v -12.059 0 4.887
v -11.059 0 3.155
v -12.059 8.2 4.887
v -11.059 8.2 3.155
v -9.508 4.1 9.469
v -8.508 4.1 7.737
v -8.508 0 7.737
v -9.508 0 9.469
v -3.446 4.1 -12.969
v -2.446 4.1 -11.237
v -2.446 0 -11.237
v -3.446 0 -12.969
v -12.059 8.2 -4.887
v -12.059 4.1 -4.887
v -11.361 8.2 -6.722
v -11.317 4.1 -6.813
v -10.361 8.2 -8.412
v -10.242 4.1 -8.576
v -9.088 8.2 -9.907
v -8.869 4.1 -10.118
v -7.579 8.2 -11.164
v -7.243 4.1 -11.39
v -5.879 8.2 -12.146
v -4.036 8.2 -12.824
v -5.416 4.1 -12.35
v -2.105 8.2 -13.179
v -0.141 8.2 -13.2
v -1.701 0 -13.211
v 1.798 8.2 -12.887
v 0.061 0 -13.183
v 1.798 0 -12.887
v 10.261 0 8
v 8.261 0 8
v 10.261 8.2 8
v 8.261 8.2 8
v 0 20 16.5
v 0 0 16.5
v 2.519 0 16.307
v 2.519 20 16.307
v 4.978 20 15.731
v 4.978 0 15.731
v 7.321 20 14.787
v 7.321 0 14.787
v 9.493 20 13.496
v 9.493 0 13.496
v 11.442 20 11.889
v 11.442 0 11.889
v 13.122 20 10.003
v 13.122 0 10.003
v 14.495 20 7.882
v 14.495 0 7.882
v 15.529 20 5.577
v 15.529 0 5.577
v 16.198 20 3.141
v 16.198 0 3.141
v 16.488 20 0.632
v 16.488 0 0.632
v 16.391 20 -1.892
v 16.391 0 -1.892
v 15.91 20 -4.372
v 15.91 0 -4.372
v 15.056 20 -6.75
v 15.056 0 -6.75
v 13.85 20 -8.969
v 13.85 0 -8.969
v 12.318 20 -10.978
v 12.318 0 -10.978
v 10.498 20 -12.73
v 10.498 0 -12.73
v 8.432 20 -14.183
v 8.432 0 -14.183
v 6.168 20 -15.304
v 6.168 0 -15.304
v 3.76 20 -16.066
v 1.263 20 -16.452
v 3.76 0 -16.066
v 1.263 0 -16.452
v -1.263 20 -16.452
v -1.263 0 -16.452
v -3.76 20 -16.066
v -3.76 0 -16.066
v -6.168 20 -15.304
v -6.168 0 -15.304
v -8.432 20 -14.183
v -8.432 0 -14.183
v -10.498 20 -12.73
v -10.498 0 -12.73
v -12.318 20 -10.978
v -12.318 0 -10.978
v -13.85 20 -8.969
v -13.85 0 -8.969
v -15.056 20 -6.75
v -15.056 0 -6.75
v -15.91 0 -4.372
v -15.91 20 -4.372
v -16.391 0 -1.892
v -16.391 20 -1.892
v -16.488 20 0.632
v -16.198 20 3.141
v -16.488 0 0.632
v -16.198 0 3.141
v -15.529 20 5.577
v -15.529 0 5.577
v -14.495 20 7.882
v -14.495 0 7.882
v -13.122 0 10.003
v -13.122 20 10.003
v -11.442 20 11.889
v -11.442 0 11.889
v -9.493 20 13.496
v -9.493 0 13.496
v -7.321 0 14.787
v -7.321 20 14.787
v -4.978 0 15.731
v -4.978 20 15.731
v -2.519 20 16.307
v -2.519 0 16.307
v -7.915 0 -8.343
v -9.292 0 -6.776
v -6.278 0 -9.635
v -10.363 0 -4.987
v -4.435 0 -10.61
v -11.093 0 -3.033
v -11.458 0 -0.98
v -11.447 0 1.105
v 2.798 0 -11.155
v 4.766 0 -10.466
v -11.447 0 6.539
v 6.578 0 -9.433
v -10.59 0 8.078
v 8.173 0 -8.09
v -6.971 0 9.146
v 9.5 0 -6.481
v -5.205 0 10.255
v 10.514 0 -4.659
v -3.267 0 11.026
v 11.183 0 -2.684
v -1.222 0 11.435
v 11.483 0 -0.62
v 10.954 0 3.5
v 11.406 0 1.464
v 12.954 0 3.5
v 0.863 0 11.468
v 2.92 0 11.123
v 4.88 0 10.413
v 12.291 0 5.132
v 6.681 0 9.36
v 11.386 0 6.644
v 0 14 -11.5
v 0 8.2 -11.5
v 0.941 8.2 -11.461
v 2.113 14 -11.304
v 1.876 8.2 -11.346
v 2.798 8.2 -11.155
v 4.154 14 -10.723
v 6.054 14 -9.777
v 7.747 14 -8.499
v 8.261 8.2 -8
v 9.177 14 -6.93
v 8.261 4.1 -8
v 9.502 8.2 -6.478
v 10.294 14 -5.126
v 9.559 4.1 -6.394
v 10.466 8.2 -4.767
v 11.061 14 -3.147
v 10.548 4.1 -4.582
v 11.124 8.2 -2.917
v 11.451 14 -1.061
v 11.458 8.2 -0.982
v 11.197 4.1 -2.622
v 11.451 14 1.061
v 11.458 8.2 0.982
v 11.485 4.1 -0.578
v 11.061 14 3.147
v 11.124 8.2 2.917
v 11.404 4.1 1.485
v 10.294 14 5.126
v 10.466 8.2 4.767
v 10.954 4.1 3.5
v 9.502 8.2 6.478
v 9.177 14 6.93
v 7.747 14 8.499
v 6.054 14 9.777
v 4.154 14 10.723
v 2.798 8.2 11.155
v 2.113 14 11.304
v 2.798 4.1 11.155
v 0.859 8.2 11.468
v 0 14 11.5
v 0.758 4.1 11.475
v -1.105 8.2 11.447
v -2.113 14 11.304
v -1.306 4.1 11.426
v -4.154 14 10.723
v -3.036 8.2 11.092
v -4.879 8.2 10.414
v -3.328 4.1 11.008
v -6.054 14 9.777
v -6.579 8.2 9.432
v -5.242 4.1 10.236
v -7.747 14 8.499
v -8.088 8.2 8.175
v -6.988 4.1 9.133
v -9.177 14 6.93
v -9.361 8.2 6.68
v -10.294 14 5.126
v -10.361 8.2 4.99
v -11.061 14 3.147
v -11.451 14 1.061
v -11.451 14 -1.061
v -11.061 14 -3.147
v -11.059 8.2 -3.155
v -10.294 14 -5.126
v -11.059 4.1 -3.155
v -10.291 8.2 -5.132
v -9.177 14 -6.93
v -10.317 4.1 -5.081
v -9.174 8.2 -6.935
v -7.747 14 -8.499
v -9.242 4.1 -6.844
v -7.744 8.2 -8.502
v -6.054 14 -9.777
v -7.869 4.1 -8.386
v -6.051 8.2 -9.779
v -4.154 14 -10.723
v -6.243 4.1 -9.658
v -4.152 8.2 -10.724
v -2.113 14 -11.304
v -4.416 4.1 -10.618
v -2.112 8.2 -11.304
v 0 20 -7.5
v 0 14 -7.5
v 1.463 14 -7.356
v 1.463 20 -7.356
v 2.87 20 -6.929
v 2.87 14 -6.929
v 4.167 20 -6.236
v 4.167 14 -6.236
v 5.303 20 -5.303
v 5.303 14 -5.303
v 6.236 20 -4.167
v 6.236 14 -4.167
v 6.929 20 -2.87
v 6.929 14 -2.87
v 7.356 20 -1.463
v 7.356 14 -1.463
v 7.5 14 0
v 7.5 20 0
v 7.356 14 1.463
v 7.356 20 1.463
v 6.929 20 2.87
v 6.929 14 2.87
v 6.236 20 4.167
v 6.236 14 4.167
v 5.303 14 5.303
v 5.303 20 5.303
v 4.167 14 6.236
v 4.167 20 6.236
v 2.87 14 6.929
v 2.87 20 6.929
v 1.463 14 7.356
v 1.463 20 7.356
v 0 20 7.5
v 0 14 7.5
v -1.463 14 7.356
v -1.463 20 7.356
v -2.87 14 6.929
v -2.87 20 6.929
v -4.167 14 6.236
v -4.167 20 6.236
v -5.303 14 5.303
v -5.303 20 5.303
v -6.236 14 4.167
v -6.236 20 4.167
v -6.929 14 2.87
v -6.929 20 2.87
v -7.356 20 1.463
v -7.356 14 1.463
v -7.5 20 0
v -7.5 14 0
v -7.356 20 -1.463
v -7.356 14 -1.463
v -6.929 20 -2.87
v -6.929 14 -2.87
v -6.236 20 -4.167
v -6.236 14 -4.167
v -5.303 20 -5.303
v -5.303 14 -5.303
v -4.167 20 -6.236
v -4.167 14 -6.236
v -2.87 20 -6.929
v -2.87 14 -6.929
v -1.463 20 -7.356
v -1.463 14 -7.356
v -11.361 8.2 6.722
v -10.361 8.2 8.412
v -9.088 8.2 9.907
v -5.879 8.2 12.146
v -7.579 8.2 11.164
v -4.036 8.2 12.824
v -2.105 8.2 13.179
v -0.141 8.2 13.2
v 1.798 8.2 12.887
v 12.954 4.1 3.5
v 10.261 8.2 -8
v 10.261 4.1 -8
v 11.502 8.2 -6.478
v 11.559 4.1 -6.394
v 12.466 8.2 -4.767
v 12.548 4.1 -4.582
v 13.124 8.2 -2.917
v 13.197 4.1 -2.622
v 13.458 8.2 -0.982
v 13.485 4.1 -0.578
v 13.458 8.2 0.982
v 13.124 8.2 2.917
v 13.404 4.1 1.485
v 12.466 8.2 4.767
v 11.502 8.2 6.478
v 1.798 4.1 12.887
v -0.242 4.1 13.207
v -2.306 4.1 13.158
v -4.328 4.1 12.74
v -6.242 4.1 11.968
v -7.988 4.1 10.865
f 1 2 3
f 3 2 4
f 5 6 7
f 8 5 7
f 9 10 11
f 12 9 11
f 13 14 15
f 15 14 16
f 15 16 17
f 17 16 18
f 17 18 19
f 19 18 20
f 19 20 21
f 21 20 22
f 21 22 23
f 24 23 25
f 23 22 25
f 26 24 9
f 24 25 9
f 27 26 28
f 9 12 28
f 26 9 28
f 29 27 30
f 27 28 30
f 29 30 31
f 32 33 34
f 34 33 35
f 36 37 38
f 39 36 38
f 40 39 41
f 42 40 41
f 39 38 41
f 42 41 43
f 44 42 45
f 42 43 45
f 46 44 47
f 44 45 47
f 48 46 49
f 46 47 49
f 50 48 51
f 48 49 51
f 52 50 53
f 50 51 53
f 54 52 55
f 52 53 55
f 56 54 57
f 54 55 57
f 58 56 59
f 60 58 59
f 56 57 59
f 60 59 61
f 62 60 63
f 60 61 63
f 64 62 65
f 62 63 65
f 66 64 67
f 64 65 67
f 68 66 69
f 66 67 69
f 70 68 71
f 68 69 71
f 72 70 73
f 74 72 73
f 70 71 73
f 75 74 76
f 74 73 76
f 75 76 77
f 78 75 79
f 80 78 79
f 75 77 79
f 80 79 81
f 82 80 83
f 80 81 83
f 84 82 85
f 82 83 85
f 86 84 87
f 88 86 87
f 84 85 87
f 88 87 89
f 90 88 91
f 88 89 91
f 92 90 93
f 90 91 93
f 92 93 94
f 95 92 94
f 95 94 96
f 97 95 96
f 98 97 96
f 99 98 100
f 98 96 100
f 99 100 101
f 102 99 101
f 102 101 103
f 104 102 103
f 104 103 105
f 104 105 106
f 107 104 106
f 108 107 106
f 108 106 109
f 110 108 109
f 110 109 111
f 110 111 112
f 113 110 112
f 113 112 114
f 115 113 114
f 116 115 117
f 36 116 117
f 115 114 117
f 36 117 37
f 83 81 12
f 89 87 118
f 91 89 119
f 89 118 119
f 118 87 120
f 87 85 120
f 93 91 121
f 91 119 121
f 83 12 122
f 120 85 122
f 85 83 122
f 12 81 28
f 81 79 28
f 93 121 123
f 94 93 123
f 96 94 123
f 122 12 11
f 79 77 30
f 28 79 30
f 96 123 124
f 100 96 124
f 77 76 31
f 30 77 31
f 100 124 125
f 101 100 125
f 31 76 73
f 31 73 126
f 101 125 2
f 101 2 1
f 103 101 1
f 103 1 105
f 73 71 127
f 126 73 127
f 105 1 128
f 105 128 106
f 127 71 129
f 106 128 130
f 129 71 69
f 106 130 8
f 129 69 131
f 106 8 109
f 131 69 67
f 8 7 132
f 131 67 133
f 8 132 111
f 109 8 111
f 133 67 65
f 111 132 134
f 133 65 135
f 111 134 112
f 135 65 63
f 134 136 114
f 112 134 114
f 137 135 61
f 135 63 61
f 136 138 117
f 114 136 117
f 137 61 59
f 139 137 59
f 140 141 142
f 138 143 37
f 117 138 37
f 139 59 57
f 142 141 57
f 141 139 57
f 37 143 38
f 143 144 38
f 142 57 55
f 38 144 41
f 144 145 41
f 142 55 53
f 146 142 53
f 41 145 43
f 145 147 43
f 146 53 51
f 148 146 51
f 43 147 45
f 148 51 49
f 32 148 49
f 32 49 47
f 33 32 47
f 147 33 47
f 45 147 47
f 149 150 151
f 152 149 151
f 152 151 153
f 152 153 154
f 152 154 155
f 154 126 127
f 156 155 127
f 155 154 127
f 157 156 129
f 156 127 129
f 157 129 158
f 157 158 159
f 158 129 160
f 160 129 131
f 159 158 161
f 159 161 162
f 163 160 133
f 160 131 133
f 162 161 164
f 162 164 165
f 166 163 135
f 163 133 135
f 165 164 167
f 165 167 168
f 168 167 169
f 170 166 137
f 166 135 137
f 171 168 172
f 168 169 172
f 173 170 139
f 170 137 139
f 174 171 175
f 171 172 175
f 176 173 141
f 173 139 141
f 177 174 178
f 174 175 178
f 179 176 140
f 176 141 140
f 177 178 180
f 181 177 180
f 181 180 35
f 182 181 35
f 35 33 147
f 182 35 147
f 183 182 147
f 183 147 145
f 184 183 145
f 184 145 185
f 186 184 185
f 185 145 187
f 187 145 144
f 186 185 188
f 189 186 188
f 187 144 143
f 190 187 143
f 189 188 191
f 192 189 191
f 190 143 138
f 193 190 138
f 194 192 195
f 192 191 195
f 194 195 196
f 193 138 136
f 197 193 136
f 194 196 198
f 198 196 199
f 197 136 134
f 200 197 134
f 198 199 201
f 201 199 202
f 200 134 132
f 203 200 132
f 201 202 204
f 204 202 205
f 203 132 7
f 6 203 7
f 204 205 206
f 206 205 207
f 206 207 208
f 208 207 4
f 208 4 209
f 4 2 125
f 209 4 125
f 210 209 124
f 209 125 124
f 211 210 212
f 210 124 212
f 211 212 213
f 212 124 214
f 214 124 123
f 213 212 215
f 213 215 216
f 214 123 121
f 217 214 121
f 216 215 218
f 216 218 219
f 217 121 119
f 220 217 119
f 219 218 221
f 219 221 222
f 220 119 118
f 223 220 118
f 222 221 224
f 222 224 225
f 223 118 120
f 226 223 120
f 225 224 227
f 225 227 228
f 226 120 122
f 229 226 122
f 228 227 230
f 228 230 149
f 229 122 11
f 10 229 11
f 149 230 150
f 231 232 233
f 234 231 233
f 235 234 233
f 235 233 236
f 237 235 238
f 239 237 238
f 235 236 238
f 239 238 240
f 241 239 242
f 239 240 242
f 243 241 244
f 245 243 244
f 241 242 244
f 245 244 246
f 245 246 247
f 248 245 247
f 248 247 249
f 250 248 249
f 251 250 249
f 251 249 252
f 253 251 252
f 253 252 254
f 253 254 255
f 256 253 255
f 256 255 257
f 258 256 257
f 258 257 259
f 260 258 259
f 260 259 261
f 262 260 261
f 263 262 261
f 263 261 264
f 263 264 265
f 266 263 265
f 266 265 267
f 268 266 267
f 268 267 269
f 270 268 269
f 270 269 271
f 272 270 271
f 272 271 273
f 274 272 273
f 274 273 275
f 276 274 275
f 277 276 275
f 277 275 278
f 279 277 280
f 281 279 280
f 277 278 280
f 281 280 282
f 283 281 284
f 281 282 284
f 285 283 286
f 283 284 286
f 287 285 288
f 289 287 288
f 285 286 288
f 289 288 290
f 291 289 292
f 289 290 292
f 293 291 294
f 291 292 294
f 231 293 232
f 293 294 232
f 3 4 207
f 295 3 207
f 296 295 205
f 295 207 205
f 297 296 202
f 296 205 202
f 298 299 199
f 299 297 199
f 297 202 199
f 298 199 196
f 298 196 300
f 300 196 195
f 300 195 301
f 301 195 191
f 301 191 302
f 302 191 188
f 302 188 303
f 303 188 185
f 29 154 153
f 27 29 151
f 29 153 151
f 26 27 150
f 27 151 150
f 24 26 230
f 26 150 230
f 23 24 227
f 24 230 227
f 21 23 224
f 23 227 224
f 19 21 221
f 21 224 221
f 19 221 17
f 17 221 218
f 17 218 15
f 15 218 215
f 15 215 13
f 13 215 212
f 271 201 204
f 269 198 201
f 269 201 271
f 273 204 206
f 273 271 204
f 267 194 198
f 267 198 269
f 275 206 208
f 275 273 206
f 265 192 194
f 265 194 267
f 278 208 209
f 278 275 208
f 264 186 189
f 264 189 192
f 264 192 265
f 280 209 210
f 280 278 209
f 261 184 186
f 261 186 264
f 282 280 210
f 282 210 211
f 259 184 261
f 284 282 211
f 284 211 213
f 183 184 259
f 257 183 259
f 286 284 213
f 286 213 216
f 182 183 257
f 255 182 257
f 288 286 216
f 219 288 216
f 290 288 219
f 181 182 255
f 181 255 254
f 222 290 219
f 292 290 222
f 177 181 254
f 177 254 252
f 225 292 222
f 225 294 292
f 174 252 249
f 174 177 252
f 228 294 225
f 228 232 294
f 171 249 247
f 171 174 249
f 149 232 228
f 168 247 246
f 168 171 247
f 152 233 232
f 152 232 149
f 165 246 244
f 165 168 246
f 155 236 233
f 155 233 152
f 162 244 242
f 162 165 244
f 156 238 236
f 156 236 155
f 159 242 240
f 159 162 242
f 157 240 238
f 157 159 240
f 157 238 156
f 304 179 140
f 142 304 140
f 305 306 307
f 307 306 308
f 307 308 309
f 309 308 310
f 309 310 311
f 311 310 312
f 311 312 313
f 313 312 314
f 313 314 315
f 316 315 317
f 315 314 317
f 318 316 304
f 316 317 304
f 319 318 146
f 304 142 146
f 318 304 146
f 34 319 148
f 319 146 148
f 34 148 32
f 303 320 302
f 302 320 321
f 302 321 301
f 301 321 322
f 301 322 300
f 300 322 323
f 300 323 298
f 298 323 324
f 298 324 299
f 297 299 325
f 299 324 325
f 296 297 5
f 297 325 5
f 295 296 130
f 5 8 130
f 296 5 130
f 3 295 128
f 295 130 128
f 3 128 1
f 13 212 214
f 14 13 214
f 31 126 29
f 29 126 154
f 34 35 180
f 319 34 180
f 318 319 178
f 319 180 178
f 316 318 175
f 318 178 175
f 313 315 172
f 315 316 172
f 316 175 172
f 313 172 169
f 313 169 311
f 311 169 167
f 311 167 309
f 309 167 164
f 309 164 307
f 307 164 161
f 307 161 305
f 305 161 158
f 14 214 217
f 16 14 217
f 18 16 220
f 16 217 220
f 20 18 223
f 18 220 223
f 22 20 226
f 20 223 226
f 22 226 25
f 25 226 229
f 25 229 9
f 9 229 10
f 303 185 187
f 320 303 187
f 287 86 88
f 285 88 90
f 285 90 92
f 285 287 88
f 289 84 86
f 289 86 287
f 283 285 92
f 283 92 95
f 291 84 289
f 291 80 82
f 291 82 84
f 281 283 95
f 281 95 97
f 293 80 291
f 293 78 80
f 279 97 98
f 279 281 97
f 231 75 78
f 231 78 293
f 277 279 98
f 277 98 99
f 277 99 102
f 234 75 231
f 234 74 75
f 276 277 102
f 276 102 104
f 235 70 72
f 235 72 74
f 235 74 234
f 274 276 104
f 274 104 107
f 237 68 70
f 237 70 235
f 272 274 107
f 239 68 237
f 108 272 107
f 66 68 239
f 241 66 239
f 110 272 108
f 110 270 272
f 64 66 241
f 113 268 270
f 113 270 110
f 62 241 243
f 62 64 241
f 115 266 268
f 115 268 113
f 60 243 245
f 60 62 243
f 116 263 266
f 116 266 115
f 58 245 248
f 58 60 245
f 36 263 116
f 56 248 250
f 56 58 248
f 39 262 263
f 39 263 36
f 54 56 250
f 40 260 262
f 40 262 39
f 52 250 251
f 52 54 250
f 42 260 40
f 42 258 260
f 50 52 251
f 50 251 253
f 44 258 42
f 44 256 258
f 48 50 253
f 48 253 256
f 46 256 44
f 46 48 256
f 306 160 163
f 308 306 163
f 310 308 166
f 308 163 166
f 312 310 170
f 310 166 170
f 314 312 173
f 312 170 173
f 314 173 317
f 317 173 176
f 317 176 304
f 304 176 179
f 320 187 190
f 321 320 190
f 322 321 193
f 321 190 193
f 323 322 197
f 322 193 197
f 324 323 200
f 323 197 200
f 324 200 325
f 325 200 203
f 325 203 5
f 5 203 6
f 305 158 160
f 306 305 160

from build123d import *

# Parameters (mm, degrees)
SKETCH1_R               = 16.5
BOSS_EXTRUDE1_DEPTH     = 20
SKETCH3_R               = 7.5
CUT_EXTRUDE2_DEPTH      = 31.732718721
SKETCH7_R               = 11.5
SKETCH7_R_2             = 7.5
CUT_EXTRUDE3_DEPTH      = 14
CUT_EXTRUDE4_REACH      = 32.733
CUT_EXTRUDE4_END_RADIUS = 11.5
CIRPATTERN1_COUNT       = 3


with BuildPart() as part:
    # Sketch1 → Boss-Extrude1 (new body)
    with BuildSketch(Plane(origin=(0, 0, 0), x_dir=(1, 0, 0), z_dir=(0, 1, 0))):
        with Locations(Location((0, 0, 0), (0, 0, 270))):
            Circle(SKETCH1_R)
    extrude(amount=BOSS_EXTRUDE1_DEPTH)

    # Sketch3 → Cut-Extrude2 (cut, through all)
    with BuildSketch(Plane.XZ):
        with Locations(Location((0, 0, 0), (0, 0, 270))):
            Circle(SKETCH3_R)
    extrude(amount=-CUT_EXTRUDE2_DEPTH, mode=Mode.SUBTRACT)

    # Sketch7 → Cut-Extrude3 (cut)
    with BuildSketch(Plane.XZ):
        with Locations(Location((0, 0, 0), (0, 0, 270))):
            Circle(SKETCH7_R)
        with Locations(Location((0, 0, 0), (0, 0, 270))):
            Circle(SKETCH7_R_2, mode=Mode.SUBTRACT)
    extrude(amount=-CUT_EXTRUDE3_DEPTH, mode=Mode.SUBTRACT)

    # Cut-Extrude4: up to this cylinder (the profile starts inside it)
    cut_extrude4_end = Plane(origin=(2, 5.122343, 0), z_dir=(0, -1, 0)) * Cylinder(CUT_EXTRUDE4_END_RADIUS, 89.466, mode=Mode.PRIVATE)
    # Sketch12 → Cut-Extrude4 (cut, up to the surface)
    with BuildSketch(Plane(origin=(0, 0, 0), x_dir=(0, 0, -1), z_dir=(1, 0, 0)), mode=Mode.PRIVATE) as cut_extrude4_sk1:
        Polygon((-8, -0.446060188), (-8, 8.2), (8, 8.2), (8, 4.1), (-3.5, 4.1), (-3.5, -0.446060188), align=None)
    cut_extrude4_tool1 = extrude(cut_extrude4_sk1.sketch, amount=CUT_EXTRUDE4_REACH, mode=Mode.PRIVATE) & cut_extrude4_end
    cut_extrude4 = cut_extrude4_tool1.solids().sort_by_distance((0, 5.122343, 1.366872))[0]
    add(cut_extrude4, mode=Mode.SUBTRACT)

    # CirPattern1: Cut-Extrude4 ×3 about axis
    cirpattern1_axis = Axis((0, 0, 0), (0, 1, 0))
    for i in range(1, CIRPATTERN1_COUNT):
        add(cut_extrude4.rotate(cirpattern1_axis, i * 360 / CIRPATTERN1_COUNT), mode=Mode.SUBTRACT)


solid = part.part
